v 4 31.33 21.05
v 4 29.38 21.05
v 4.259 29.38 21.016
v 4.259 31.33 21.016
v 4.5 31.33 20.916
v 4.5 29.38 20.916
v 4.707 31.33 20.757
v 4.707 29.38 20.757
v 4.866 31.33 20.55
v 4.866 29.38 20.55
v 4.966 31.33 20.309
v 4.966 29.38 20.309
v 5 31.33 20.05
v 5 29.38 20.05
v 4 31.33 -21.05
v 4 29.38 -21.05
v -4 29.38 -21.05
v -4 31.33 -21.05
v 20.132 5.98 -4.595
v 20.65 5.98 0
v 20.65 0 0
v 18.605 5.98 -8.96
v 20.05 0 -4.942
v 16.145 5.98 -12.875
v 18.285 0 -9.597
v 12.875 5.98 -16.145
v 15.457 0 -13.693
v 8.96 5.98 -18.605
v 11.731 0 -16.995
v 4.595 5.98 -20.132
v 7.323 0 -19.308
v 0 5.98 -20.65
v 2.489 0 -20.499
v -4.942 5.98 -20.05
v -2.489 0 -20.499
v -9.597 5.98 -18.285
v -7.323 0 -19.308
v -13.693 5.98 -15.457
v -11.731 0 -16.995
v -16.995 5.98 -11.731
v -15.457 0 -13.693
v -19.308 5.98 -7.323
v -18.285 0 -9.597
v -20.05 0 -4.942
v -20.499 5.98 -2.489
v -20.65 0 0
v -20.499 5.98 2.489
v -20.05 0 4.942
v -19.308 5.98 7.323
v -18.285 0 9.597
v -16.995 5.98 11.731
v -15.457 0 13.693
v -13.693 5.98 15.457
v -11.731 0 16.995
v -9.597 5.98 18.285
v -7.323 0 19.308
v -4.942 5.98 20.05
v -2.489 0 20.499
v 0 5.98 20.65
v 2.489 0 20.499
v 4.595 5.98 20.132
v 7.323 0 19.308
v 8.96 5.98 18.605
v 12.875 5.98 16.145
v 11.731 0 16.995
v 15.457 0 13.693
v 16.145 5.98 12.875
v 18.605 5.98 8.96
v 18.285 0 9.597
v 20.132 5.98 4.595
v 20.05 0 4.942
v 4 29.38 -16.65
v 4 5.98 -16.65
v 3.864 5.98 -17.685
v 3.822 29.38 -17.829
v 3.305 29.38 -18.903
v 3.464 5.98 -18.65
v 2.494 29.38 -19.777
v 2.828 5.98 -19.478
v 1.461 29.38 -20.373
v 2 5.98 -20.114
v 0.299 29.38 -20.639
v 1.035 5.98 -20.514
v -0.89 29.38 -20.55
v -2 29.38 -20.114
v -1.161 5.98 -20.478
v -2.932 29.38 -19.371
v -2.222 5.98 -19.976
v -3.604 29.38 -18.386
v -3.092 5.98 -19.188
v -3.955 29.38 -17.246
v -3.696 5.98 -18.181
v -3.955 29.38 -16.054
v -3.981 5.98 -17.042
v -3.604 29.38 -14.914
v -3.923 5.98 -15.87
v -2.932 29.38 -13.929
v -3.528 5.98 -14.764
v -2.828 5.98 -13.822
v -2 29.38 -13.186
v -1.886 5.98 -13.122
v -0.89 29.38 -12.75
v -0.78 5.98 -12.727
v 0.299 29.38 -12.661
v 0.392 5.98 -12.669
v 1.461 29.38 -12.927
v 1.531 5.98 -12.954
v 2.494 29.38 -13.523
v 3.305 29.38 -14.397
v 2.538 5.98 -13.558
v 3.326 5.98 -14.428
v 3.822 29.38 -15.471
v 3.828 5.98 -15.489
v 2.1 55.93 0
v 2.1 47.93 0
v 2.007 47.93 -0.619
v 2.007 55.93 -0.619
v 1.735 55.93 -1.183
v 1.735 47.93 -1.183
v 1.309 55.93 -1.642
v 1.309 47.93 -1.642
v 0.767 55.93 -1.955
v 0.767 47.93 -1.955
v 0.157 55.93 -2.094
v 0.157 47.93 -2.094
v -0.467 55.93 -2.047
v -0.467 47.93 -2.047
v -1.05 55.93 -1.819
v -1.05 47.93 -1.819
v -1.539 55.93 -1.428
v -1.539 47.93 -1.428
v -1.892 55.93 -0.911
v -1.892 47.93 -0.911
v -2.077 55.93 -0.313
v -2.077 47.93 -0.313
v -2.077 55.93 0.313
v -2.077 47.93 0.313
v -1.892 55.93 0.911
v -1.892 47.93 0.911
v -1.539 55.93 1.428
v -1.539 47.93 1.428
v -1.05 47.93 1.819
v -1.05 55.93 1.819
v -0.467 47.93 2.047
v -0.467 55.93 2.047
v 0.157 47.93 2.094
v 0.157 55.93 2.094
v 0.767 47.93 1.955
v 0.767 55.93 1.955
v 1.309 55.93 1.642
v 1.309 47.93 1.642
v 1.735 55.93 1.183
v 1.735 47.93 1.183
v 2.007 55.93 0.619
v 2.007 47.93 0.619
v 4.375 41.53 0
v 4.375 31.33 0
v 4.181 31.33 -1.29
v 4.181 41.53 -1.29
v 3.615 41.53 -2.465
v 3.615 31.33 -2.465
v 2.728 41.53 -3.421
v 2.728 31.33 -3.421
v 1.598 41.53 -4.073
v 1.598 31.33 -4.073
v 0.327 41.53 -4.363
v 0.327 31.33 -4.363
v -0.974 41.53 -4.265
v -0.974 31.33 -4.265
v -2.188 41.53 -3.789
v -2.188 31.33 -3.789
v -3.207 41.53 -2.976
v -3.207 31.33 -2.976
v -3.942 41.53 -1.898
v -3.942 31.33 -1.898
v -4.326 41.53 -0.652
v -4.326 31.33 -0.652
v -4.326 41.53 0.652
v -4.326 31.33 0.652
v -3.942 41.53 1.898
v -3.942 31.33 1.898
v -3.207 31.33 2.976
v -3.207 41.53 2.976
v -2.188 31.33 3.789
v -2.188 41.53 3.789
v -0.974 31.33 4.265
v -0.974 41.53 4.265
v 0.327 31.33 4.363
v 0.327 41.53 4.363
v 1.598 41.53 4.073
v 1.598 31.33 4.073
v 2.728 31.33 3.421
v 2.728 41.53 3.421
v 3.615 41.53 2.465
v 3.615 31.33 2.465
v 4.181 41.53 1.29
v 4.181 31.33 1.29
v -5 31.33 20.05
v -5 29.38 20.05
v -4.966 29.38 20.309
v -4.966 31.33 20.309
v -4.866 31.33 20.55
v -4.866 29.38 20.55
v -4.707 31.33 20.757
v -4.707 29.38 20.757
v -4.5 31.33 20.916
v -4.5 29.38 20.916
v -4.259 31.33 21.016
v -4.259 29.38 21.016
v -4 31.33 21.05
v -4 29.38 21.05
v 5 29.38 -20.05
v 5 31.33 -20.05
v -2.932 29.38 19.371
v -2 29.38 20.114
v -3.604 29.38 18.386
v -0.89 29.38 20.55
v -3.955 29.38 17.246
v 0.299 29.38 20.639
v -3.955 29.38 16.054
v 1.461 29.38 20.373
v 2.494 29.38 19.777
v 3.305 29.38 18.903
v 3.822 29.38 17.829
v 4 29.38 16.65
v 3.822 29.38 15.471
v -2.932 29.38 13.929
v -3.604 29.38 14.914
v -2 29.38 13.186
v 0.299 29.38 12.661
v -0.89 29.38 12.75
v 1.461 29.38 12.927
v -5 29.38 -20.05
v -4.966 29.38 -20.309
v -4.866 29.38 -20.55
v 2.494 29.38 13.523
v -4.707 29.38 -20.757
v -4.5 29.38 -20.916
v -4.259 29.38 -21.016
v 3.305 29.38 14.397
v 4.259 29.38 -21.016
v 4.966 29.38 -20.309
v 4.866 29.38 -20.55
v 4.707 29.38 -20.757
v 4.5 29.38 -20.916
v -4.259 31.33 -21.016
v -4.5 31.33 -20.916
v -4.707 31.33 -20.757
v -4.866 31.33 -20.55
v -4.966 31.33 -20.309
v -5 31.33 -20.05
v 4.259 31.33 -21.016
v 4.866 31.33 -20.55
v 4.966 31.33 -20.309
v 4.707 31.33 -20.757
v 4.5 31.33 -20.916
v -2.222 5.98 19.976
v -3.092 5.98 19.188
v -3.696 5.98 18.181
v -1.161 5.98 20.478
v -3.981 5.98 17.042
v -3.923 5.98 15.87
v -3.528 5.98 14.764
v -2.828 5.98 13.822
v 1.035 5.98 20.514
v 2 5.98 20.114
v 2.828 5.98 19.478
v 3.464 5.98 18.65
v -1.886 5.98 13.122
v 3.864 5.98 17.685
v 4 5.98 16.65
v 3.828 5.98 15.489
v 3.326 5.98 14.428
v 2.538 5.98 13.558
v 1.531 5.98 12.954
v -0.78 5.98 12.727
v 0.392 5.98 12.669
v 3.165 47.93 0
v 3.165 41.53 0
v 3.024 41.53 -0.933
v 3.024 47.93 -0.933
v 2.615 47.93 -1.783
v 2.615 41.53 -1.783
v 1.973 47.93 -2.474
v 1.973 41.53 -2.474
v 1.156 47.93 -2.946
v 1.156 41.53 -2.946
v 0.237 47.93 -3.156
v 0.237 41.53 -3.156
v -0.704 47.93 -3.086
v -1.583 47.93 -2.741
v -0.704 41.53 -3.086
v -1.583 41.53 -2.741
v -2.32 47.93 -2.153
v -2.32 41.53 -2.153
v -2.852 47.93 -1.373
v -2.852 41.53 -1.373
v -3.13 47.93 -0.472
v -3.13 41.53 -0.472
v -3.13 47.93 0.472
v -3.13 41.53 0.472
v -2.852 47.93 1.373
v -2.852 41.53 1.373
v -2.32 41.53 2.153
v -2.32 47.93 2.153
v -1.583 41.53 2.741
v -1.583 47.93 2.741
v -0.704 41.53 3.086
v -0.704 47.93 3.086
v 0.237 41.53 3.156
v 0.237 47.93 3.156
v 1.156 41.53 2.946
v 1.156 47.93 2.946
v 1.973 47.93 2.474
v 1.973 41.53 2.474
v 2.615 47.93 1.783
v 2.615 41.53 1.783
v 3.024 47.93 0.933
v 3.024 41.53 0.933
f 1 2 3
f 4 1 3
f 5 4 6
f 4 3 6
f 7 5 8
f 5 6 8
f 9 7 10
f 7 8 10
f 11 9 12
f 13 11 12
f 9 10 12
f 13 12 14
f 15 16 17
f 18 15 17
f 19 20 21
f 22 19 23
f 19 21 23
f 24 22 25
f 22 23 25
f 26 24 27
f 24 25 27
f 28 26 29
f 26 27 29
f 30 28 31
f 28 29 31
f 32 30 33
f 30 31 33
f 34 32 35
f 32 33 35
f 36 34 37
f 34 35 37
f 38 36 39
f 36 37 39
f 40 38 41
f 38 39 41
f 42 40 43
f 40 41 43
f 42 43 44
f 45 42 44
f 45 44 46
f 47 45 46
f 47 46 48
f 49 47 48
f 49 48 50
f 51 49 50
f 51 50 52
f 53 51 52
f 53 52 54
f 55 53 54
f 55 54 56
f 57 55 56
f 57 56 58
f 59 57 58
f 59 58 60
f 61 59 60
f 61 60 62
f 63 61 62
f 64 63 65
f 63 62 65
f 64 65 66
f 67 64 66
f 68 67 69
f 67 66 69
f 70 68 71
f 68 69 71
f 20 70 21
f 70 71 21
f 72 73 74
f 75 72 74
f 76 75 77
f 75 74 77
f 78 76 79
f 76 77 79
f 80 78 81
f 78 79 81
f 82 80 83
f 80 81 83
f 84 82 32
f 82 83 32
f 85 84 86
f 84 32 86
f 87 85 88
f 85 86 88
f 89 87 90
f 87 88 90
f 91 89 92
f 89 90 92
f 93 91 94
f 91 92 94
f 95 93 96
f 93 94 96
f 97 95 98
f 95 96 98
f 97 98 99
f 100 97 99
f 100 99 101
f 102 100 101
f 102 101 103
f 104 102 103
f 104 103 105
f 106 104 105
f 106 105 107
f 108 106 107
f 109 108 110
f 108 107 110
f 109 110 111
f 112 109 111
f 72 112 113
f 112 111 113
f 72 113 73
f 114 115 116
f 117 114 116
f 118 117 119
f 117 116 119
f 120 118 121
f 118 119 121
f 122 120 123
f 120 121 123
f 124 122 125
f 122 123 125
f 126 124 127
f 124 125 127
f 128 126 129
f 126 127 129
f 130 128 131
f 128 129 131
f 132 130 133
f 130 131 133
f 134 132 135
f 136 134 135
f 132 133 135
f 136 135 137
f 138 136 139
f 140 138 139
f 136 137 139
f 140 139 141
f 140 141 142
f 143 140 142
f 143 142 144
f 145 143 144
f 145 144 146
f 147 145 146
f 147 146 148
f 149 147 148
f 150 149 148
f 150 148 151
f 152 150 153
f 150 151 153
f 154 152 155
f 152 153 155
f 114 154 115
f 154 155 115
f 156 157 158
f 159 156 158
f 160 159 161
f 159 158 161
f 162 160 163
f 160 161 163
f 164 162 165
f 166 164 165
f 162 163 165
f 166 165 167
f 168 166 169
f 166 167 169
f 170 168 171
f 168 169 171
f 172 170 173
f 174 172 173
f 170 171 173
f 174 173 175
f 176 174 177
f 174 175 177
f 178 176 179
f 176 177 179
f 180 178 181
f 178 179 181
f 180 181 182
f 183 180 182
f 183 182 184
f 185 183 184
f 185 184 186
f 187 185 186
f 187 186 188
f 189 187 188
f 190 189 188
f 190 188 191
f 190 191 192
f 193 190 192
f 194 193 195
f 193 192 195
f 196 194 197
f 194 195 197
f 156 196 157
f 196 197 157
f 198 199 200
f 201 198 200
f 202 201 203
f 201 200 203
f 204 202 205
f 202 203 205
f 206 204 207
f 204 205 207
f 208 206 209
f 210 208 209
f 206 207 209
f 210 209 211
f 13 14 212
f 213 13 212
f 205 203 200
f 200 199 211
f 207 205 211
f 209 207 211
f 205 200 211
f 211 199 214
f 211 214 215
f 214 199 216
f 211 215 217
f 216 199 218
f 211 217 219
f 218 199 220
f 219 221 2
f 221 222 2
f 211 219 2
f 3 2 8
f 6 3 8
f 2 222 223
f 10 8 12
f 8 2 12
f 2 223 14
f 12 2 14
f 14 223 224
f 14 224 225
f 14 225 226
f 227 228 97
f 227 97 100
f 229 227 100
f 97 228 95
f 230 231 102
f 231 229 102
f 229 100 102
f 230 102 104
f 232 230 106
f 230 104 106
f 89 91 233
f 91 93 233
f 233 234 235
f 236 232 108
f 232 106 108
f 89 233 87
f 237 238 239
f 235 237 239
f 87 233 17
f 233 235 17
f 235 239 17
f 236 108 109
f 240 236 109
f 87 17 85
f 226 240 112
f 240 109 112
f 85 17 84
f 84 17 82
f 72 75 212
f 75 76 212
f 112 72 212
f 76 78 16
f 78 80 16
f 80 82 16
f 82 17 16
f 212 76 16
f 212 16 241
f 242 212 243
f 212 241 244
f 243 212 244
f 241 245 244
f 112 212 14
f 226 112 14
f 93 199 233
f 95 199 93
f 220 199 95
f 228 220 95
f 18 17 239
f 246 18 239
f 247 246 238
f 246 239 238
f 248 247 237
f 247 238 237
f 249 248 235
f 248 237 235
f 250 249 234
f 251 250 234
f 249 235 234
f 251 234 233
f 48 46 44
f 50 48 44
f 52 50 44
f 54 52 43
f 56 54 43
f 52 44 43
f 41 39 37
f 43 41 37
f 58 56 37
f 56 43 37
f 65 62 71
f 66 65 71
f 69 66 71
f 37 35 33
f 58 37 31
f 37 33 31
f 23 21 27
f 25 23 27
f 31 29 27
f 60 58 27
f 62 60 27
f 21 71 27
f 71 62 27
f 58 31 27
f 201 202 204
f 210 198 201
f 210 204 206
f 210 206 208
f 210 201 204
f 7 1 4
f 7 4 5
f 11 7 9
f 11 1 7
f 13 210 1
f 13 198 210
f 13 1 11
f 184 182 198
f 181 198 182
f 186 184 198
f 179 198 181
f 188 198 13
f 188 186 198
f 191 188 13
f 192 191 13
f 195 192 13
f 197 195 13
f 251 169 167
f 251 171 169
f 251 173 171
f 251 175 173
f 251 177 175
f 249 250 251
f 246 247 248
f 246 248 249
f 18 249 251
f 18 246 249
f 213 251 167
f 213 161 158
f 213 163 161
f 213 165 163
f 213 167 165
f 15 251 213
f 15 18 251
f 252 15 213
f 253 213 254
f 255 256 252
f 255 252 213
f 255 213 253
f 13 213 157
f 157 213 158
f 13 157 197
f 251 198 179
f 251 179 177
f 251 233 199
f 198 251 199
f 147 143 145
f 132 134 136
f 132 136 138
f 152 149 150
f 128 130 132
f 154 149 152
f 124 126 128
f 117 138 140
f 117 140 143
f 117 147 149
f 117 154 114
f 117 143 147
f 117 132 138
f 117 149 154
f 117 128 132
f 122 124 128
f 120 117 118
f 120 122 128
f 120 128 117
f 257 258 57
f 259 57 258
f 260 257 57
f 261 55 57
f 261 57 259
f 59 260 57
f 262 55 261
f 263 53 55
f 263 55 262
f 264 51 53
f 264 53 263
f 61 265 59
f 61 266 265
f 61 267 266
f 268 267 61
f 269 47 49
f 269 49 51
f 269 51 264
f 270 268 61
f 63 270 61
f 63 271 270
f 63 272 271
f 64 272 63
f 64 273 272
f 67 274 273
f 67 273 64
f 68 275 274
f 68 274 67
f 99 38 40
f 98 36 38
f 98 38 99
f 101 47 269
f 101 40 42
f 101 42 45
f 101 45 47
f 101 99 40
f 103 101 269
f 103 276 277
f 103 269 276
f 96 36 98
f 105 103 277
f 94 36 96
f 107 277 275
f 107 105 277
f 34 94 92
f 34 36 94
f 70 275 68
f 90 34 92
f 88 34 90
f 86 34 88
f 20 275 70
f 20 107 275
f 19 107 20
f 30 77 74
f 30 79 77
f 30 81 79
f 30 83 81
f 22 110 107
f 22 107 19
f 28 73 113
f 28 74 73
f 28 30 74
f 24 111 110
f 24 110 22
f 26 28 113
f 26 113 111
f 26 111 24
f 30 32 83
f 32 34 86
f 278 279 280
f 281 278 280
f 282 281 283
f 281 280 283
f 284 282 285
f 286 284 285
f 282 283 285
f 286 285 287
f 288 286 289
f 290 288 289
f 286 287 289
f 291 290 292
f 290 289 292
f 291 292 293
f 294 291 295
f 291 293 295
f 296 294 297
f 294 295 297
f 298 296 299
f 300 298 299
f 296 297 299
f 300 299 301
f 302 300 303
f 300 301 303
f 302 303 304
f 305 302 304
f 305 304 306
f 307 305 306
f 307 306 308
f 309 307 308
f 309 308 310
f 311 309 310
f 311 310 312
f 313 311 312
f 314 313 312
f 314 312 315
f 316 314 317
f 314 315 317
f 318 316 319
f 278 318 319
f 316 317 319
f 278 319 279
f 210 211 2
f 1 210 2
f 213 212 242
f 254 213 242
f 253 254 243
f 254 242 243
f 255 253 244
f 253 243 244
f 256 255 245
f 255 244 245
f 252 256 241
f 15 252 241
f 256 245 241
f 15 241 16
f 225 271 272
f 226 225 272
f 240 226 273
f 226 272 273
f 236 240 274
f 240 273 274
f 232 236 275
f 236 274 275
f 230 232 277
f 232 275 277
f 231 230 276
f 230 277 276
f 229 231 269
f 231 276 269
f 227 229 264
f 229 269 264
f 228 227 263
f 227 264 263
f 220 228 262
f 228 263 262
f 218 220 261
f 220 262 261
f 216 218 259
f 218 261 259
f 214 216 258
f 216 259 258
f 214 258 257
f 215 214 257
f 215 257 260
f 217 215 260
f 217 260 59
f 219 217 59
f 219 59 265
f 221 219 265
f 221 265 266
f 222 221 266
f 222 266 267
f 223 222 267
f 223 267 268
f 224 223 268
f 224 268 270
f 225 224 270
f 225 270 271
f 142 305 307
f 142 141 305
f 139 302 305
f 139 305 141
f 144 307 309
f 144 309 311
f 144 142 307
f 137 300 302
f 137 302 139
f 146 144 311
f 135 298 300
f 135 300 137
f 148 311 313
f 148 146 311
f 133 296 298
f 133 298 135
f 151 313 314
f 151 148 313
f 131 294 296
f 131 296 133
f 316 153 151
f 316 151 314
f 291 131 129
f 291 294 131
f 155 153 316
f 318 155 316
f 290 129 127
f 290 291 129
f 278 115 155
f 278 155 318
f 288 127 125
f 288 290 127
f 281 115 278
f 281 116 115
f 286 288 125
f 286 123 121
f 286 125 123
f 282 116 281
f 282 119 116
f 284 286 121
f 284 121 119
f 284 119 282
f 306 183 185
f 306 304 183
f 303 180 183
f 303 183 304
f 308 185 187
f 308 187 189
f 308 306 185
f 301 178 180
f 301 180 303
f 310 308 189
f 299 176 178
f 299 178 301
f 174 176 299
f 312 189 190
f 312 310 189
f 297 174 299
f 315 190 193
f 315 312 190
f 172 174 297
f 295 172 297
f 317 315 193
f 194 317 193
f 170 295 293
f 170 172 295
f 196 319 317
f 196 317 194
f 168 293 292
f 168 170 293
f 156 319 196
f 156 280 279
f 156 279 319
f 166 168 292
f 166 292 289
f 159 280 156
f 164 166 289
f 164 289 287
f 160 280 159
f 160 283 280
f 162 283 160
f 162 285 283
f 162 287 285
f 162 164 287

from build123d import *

# Parameters (mm, degrees)
SKETCH1_R           = 20.65
BOSS_EXTRUDE1_DEPTH = 5.98
SKETCH2_R           = 4
BOSS_EXTRUDE2_DEPTH = 23.4
BOSS_EXTRUDE3_DEPTH = 1.95
SKETCH4_R           = 4.375
BOSS_EXTRUDE4_DEPTH = 10.2
SKETCH5_R           = 3.165
BOSS_EXTRUDE5_DEPTH = 6.4
SKETCH6_R           = 2.1
BOSS_EXTRUDE6_DEPTH = 8


with BuildPart() as part:
    # Sketch1 → Boss-Extrude1 (new body)
    with BuildSketch(Plane(origin=(0, 0, 0), x_dir=(1, 0, 0), z_dir=(0, 1, 0))):
        Circle(SKETCH1_R)
    extrude(amount=BOSS_EXTRUDE1_DEPTH)

    # Sketch2 → Boss-Extrude2 (add)
    with BuildSketch(Plane(origin=(0, 5.98, 0), x_dir=(1, 0, 0), z_dir=(0, 1, 0))):
        with Locations((0, -16.65)):
            Circle(SKETCH2_R)
        with Locations((0, 16.65)):
            Circle(SKETCH2_R)
    extrude(amount=BOSS_EXTRUDE2_DEPTH)

    # Sketch3 → Boss-Extrude3 (add)
    with BuildSketch(Plane(origin=(0, 29.38, 0), x_dir=(1, 0, 0), z_dir=(0, 1, 0))):
        with BuildLine():
            Line((-4, -21.05), (4, -21.05))
            ThreePointArc((4, -21.05), (4.707106781, -20.757106781), (5, -20.05))
            Line((5, -20.05), (5, 20.05))
            ThreePointArc((5, 20.05), (4.707106781, 20.757106781), (4, 21.05))
            Line((4, 21.05), (-4, 21.05))
            ThreePointArc((-4, 21.05), (-4.707106781, 20.757106781), (-5, 20.05))
            Line((-5, 20.05), (-5, -20.05))
            ThreePointArc((-5, -20.05), (-4.707106781, -20.757106781), (-4, -21.05))
        make_face()
    extrude(amount=BOSS_EXTRUDE3_DEPTH)

    # Sketch4 → Boss-Extrude4 (add)
    with BuildSketch(Plane(origin=(0, 31.33, 0), x_dir=(1, 0, 0), z_dir=(0, 1, 0))):
        Circle(SKETCH4_R)
    extrude(amount=BOSS_EXTRUDE4_DEPTH)

    # Sketch5 → Boss-Extrude5 (add)
    with BuildSketch(Plane(origin=(0, 41.53, 0), x_dir=(1, 0, 0), z_dir=(0, 1, 0))):
        Circle(SKETCH5_R)
    extrude(amount=BOSS_EXTRUDE5_DEPTH)

    # Sketch6 → Boss-Extrude6 (add)
    with BuildSketch(Plane(origin=(0, 47.93, 0), x_dir=(1, 0, 0), z_dir=(0, 1, 0))):
        Circle(SKETCH6_R)
    extrude(amount=BOSS_EXTRUDE6_DEPTH)


solid = part.part
